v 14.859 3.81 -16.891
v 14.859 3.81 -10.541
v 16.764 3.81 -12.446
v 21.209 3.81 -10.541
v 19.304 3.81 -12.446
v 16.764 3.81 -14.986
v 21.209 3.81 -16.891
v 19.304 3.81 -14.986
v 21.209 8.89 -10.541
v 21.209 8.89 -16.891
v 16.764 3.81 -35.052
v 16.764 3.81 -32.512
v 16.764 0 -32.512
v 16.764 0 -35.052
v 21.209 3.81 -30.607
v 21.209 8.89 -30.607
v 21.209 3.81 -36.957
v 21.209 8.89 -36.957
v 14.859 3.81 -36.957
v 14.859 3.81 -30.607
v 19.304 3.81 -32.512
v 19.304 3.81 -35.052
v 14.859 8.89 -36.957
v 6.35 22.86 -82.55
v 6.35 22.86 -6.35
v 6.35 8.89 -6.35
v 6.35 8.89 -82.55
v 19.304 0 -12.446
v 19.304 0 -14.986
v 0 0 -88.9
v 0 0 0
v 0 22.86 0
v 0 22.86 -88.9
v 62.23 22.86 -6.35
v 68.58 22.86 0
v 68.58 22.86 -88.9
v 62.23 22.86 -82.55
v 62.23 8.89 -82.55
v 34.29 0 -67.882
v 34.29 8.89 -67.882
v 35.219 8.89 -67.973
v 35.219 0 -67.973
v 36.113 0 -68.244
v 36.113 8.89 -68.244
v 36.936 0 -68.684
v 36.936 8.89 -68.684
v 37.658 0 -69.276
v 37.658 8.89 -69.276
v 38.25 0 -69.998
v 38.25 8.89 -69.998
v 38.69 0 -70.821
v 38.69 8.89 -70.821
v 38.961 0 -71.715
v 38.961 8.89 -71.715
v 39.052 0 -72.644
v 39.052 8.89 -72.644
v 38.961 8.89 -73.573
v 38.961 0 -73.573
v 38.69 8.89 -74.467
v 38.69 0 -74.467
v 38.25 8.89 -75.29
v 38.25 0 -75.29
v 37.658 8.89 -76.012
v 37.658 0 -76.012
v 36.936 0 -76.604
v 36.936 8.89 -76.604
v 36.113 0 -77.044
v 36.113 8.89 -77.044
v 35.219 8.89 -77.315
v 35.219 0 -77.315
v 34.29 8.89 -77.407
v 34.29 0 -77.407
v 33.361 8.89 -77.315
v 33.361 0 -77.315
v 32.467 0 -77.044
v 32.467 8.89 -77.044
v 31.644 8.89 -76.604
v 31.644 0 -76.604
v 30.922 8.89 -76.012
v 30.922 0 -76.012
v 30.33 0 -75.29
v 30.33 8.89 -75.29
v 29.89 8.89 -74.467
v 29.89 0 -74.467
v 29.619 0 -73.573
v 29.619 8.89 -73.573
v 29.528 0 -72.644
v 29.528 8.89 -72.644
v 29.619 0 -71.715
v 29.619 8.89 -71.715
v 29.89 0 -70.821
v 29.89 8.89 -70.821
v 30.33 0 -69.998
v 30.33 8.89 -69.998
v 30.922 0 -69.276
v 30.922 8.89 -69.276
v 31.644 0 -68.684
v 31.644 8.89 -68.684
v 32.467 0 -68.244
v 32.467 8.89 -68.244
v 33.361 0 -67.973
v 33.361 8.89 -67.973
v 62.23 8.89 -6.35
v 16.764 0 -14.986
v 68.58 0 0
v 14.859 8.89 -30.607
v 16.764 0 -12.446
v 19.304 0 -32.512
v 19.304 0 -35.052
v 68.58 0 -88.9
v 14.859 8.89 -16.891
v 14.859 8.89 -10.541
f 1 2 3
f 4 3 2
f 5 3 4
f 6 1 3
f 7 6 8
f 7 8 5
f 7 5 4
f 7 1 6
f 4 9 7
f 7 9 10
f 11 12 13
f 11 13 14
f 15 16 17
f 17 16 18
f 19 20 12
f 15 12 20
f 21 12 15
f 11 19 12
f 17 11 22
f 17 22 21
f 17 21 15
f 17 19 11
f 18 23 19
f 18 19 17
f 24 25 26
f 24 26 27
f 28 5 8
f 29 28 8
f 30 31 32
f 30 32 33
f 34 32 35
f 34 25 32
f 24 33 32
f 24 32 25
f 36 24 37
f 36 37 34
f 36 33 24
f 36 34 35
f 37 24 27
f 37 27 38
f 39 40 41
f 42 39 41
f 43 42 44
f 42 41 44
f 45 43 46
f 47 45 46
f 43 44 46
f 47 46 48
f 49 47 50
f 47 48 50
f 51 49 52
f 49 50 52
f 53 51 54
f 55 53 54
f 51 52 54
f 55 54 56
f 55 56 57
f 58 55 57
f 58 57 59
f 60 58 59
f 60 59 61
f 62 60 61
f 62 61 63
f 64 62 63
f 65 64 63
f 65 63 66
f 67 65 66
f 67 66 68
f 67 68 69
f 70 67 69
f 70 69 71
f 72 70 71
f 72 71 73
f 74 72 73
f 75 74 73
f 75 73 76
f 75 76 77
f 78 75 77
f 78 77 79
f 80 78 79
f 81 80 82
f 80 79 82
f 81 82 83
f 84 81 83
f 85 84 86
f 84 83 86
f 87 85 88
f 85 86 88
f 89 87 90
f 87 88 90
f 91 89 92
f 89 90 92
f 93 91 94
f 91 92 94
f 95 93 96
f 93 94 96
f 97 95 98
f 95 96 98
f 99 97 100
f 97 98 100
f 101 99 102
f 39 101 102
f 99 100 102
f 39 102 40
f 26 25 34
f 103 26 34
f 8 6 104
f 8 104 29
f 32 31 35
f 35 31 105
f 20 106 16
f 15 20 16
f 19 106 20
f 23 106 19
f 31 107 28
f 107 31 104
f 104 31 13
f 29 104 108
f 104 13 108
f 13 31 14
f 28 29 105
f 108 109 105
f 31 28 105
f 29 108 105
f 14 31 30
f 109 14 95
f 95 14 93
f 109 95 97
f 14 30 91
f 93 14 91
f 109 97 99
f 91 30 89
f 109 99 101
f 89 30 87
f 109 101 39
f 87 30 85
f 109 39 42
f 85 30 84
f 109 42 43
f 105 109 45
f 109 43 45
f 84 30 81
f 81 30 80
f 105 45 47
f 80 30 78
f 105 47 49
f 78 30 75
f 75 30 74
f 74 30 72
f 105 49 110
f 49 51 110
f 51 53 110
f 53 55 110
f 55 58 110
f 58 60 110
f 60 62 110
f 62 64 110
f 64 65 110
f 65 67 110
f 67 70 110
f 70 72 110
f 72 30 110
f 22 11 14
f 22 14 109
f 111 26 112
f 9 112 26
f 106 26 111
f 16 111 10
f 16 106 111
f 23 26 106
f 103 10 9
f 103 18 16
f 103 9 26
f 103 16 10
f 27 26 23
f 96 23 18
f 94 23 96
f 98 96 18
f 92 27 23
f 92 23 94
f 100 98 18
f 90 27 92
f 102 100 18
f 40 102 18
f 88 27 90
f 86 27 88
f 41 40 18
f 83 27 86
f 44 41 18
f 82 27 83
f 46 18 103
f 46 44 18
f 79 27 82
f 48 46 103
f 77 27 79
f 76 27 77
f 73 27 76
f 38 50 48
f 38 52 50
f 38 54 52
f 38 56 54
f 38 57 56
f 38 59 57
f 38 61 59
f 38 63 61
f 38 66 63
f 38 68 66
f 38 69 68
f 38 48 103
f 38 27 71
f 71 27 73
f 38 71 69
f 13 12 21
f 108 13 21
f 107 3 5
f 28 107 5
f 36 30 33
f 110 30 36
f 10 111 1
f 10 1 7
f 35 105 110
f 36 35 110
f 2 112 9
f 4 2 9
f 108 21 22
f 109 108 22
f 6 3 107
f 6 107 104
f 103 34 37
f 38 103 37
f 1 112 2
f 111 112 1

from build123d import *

# Parameters (mm, degrees)
SKETCH1_W           = 68.58
SKETCH1_H           = 88.9
BOSS_EXTRUDE1_DEPTH = 22.86
SKETCH2_W           = 55.88
SKETCH2_H           = 76.2
CUT_EXTRUDE1_DEPTH  = 13.97
SKETCH6_W           = 6.35
SKETCH6_H           = 6.35
CUT_EXTRUDE3_DEPTH  = 5.08
SKETCH7_W           = 2.54
SKETCH7_H           = 2.54
CUT_EXTRUDE4_DEPTH  = 114.882961412
SKETCH5_R           = 4.7625
CUT_EXTRUDE5_DEPTH  = 114.144099714


with BuildPart() as part:
    # Sketch1 → Boss-Extrude1 (new body)
    with BuildSketch(Plane(origin=(0, 0, 0), x_dir=(1, 0, 0), z_dir=(0, 1, 0))):
        with Locations((34.29, 44.45)):
            Rectangle(SKETCH1_W, SKETCH1_H)
    extrude(amount=BOSS_EXTRUDE1_DEPTH)

    # Sketch2 → Cut-Extrude1 (cut)
    with BuildSketch(Plane(origin=(0, 22.86, 0), x_dir=(1, 0, 0), z_dir=(0, 1, 0))):
        with Locations((34.29, 44.45)):
            Rectangle(SKETCH2_W, SKETCH2_H)
    extrude(amount=-CUT_EXTRUDE1_DEPTH, mode=Mode.SUBTRACT)

    # Sketch6 → Cut-Extrude3 (cut)
    with BuildSketch(Plane(origin=(0, 8.89, 0), x_dir=(1, 0, 0), z_dir=(0, 1, 0))):
        with Locations((18.034, 33.782)):
            Rectangle(SKETCH6_W, SKETCH6_H)
        with Locations((18.034, 13.716)):
            Rectangle(SKETCH6_W, SKETCH6_H)
    extrude(amount=-CUT_EXTRUDE3_DEPTH, mode=Mode.SUBTRACT)

    # Sketch7 → Cut-Extrude4 (cut, through all)
    with BuildSketch(Plane(origin=(0, 3.81, 0), x_dir=(1, 0, 0), z_dir=(0, 1, 0))):
        with Locations((18.034, 33.782)):
            Rectangle(SKETCH7_W, SKETCH7_H)
        with Locations((18.034, 13.716)):
            Rectangle(SKETCH7_W, SKETCH7_H)
    extrude(amount=-CUT_EXTRUDE4_DEPTH, mode=Mode.SUBTRACT)

    # Sketch5 → Cut-Extrude5 (cut, through all)
    with BuildSketch(Plane(origin=(0, 8.89, 0), x_dir=(1, 0, 0), z_dir=(0, 1, 0))):
        with Locations(Location((34.29, 72.644, 0), (0, 0, 270))):
            Circle(SKETCH5_R)
    extrude(amount=-CUT_EXTRUDE5_DEPTH, mode=Mode.SUBTRACT)


solid = part.part
